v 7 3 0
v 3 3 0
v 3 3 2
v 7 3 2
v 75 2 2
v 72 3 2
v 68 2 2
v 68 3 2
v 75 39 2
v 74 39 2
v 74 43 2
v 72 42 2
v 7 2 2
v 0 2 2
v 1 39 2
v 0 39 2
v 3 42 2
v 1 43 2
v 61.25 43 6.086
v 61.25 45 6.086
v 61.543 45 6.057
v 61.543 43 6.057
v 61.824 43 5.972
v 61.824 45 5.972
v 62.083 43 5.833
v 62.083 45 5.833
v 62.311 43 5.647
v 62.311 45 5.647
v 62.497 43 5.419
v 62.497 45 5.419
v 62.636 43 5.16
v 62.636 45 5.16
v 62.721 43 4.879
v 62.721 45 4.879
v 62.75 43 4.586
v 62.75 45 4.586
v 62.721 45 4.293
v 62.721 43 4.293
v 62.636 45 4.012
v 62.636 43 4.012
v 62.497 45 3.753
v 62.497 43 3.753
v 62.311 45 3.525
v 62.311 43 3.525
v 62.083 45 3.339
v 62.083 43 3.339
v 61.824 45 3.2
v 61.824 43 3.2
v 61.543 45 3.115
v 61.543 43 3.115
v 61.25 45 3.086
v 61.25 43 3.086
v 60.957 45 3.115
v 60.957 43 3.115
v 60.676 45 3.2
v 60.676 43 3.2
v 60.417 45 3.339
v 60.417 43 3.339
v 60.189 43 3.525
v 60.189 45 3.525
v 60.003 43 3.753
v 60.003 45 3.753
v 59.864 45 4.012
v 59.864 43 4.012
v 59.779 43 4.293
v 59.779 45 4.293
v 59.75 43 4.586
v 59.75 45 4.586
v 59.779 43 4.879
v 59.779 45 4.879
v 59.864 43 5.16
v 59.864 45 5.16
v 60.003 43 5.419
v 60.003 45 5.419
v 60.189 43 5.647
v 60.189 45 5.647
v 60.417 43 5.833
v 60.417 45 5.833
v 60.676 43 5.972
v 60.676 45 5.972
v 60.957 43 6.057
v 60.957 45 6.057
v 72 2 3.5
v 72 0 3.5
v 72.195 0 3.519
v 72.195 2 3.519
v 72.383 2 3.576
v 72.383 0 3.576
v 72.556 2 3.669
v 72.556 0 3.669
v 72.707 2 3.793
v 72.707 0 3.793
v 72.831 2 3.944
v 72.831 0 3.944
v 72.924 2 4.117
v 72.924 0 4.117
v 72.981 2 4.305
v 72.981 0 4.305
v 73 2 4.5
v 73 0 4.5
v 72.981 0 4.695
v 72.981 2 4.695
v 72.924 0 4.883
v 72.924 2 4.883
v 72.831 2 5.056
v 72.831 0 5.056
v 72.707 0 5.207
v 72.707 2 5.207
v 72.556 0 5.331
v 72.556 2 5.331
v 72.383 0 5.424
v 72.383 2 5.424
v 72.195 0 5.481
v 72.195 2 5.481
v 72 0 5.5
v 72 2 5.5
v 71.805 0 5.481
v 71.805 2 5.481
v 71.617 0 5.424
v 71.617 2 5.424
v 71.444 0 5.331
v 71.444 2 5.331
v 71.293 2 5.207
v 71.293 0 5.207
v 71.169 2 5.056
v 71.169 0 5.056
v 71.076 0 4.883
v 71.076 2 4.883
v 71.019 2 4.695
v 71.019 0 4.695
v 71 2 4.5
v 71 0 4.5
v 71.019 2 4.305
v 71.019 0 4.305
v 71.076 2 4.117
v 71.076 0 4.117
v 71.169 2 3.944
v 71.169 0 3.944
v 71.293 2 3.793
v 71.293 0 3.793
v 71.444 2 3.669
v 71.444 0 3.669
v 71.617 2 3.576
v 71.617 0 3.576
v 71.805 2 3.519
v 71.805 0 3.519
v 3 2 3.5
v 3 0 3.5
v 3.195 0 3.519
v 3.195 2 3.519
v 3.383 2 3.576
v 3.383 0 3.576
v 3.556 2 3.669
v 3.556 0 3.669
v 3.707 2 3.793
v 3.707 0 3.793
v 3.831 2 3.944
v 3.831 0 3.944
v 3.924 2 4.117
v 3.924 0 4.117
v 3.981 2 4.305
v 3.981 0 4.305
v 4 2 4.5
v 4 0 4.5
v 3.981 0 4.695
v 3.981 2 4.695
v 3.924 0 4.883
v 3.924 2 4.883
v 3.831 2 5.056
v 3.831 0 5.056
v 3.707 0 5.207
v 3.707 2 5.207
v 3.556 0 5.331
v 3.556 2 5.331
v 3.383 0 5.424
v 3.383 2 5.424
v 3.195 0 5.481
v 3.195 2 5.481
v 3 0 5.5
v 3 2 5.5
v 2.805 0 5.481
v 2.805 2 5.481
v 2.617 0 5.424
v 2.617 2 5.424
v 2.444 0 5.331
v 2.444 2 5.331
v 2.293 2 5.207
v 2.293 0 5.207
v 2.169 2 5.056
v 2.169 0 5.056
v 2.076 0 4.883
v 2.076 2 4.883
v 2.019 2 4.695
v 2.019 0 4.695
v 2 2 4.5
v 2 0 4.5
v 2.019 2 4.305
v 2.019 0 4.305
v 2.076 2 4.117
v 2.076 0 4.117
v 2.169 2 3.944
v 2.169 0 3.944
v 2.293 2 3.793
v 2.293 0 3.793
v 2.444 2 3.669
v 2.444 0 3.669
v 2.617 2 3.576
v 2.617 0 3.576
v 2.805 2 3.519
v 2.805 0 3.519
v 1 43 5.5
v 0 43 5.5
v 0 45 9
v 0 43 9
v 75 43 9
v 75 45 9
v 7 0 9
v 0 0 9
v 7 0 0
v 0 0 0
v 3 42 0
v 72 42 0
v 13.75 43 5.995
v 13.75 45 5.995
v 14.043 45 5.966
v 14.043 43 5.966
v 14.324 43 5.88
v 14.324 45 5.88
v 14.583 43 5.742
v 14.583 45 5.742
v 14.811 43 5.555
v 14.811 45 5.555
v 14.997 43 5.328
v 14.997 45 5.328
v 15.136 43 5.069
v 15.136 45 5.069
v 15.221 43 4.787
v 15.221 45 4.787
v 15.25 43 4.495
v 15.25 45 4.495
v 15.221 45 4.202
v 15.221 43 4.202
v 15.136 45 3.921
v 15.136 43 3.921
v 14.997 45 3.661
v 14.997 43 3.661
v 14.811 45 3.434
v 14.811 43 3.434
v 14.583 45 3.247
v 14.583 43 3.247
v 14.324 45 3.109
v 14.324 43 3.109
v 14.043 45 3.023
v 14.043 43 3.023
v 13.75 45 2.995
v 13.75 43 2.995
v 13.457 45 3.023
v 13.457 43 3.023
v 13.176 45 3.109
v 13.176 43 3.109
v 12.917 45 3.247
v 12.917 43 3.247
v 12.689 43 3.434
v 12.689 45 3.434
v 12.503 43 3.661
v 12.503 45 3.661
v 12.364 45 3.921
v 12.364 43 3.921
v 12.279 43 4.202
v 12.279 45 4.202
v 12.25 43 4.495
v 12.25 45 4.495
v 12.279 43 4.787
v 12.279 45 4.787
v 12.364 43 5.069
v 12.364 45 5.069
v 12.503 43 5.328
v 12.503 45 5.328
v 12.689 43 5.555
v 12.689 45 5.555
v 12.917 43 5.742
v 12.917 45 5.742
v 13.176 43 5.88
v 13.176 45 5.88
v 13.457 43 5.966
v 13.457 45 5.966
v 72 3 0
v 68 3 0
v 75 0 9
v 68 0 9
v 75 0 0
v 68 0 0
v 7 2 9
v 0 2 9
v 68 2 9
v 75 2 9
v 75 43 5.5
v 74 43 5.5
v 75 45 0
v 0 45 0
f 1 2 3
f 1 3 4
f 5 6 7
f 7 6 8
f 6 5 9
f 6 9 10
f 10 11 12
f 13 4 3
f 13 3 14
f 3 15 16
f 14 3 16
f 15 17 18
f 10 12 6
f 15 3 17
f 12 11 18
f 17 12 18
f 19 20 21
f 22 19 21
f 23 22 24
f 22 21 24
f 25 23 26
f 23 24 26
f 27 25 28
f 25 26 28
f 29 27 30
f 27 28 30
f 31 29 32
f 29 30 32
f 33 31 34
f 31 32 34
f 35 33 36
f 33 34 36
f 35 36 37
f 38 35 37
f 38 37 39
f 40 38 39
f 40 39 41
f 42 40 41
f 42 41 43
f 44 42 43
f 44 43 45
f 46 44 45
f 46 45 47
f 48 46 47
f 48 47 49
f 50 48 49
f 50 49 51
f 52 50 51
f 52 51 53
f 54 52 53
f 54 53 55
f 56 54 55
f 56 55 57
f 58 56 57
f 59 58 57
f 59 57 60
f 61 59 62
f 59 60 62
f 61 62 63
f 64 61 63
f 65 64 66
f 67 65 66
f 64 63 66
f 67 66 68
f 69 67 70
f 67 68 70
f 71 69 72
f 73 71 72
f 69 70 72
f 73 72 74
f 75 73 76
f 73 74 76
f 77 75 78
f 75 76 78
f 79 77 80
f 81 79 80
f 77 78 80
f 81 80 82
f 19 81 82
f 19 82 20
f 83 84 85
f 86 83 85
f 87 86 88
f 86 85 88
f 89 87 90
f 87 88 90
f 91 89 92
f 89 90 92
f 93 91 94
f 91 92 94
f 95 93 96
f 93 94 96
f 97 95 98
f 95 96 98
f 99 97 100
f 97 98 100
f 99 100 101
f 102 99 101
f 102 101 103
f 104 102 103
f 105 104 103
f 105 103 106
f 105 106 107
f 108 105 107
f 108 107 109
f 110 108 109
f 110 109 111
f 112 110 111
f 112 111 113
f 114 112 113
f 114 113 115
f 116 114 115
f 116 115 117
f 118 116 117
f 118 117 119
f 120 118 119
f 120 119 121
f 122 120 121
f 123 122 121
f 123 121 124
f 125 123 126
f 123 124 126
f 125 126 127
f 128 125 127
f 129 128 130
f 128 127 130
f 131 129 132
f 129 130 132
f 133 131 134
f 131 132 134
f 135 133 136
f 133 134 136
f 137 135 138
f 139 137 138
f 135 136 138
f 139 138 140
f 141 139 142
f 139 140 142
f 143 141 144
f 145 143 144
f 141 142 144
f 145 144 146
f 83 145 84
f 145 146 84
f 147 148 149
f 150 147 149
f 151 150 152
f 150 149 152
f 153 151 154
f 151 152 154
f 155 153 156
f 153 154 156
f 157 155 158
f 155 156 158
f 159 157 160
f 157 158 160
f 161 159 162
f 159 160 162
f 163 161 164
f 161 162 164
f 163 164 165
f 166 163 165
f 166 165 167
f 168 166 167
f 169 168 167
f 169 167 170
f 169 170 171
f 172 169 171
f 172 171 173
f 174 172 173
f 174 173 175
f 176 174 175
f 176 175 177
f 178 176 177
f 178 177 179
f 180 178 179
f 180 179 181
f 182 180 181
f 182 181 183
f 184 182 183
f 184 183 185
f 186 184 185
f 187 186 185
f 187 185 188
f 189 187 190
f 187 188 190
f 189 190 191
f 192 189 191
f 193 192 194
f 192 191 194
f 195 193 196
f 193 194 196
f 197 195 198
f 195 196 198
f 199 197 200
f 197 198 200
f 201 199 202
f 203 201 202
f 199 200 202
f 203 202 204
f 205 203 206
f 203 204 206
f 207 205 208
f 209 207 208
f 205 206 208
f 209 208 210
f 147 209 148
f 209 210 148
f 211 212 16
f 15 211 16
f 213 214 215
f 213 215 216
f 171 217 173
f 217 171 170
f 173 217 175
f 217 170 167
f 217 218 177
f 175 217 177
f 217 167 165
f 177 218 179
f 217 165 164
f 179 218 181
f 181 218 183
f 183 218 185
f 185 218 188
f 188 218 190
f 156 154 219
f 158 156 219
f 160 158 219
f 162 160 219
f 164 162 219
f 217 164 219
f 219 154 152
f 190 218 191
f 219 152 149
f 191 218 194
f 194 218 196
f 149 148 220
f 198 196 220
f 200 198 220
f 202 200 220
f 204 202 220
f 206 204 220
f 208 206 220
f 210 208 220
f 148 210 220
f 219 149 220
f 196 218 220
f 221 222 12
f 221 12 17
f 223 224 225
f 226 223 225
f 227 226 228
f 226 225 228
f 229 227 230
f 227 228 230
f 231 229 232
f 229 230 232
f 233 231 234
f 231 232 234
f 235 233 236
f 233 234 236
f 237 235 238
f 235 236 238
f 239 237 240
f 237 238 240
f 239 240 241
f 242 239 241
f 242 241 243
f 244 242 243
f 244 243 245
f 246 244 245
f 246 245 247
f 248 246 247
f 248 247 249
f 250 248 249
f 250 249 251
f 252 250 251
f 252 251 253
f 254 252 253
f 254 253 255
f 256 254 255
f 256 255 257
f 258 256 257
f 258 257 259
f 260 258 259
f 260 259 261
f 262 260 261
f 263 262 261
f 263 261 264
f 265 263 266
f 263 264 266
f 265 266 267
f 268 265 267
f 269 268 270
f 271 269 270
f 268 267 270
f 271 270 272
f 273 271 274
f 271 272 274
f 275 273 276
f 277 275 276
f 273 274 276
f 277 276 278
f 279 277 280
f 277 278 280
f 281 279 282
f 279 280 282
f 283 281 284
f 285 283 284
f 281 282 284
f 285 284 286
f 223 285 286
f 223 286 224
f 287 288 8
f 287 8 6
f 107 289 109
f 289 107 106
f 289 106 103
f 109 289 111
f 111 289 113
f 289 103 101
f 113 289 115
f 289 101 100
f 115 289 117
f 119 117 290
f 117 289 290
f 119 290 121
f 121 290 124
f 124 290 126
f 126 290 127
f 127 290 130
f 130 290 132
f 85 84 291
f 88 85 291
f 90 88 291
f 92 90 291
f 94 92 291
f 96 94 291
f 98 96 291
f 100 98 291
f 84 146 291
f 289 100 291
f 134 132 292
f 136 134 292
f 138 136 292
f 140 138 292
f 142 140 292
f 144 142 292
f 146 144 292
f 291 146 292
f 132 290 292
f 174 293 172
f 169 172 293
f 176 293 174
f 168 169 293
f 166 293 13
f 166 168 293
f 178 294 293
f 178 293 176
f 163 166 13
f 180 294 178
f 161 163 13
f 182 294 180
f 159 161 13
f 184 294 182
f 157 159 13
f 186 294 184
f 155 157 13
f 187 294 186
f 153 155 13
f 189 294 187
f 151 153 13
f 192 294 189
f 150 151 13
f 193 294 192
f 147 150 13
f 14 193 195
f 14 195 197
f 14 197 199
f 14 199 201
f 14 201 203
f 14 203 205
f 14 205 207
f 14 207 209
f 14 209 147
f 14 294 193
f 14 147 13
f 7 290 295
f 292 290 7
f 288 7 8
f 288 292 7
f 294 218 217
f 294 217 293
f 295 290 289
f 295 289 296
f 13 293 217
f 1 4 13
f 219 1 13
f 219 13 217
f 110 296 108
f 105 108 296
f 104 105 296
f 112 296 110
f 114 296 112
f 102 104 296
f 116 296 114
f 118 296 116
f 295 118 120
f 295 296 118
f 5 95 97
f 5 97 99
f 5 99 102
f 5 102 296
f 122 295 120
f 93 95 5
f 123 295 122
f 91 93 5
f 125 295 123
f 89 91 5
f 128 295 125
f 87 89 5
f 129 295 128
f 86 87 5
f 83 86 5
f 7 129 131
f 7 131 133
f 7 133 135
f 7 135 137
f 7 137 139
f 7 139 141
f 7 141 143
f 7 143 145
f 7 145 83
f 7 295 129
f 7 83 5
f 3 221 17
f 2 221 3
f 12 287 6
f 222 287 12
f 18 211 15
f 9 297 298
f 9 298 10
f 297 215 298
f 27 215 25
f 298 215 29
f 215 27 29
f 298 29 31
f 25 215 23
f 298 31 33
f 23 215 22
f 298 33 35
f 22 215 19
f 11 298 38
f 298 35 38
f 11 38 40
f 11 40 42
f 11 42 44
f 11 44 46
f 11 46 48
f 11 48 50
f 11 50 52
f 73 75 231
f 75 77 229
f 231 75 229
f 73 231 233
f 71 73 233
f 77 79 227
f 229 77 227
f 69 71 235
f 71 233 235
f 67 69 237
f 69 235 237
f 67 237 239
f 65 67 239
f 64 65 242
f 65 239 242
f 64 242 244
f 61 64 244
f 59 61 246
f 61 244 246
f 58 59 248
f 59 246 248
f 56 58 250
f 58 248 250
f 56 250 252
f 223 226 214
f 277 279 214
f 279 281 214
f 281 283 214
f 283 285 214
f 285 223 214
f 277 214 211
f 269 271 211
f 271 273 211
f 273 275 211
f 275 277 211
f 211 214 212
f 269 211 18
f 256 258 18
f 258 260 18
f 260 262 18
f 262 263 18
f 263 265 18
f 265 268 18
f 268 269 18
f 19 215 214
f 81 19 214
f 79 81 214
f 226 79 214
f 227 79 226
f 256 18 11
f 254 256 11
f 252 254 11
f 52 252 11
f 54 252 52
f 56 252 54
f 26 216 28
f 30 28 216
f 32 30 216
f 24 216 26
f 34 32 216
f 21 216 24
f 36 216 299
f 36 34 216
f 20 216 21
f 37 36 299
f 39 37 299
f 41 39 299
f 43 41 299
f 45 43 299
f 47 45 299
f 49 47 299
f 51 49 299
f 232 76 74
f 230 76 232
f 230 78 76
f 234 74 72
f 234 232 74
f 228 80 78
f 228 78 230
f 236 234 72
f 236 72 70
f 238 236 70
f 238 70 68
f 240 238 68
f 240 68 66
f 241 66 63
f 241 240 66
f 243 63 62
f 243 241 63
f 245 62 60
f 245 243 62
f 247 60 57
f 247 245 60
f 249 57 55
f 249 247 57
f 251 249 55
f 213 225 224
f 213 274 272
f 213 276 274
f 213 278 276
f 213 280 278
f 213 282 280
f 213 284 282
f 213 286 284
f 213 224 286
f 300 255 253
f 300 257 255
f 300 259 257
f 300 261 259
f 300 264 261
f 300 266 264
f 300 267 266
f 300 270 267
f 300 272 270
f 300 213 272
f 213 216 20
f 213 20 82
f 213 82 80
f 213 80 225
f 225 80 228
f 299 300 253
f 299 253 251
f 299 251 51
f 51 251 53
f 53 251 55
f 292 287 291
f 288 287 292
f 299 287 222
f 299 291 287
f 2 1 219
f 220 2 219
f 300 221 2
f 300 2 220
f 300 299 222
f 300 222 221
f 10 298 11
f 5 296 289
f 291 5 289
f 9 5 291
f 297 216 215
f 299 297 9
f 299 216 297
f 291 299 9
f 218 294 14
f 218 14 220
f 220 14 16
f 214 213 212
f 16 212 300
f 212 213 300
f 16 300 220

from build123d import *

# Parameters (mm, degrees)
BOSS_EXTRUDE1_DEPTH = 2
BOSS_EXTRUDE2_REACH = 89.487
SKETCH2_W           = 7
SKETCH2_H           = 2
BOSS_EXTRUDE3_DEPTH = 1
CUT_EXTRUDE1_REACH  = 89.926
SKETCH7_R           = 1.5
CUT_EXTRUDE2_REACH  = 89.926
SKETCH8_R           = 1
SKETCH10_W          = 61
SKETCH10_H          = 2
CUT_EXTRUDE3_DEPTH  = 88.74394566


with BuildPart() as part:
    # Sketch1 → Boss-Extrude1 (new body)
    with BuildSketch(Plane.XY):
        Polygon((3, 3), (7, 3), (7, 0), (0, 0), (0, 45), (75, 45), (75, 0), (68, 0), (68, 3), (72, 3), (72, 42), (3, 42), align=None)
    extrude(amount=BOSS_EXTRUDE1_DEPTH)

    # Boss-Extrude2: up to this face of the body (flat: up to its plane)
    boss_extrude2_end = Plane(part.part.faces().sort_by_distance((75, 22.5, 1))[0])
    # Sketch2 → Boss-Extrude2 (add, up to the picked face)
    with BuildSketch(Plane(origin=(0, 0, 0), x_dir=(0, 0, -1), z_dir=(1, 0, 0)), mode=Mode.PRIVATE) as boss_extrude2_sk1:
        with Locations((-5.5, 44)):
            Rectangle(SKETCH2_W, SKETCH2_H)
    boss_extrude2_tool1 = split(extrude(boss_extrude2_sk1.sketch, amount=BOSS_EXTRUDE2_REACH, mode=Mode.PRIVATE), bisect_by=boss_extrude2_end, keep=Keep.BOTH, mode=Mode.PRIVATE)
    # Sketch2 → Boss-Extrude2 (add, up to the picked face)
    with BuildSketch(Plane(origin=(0, 0, 0), x_dir=(0, 0, -1), z_dir=(1, 0, 0)), mode=Mode.PRIVATE) as boss_extrude2_sk2:
        with Locations((-5.5, 1)):
            Rectangle(SKETCH2_W, SKETCH2_H)
    boss_extrude2_tool2 = split(extrude(boss_extrude2_sk2.sketch, amount=BOSS_EXTRUDE2_REACH, mode=Mode.PRIVATE), bisect_by=boss_extrude2_end, keep=Keep.BOTH, mode=Mode.PRIVATE)
    add(boss_extrude2_tool1.solids().sort_by(Axis((0, 44, 5.5), (1, 0, 0)))[0])
    add(boss_extrude2_tool2.solids().sort_by(Axis((0, 1, 5.5), (1, 0, 0)))[0])

    # Sketch5 → Boss-Extrude3 (add)
    with BuildSketch(Plane.ZY):
        Polygon((5.5, 43), (2, 39), (2, 43), align=None)
    boss_extrude3 = extrude(amount=-BOSS_EXTRUDE3_DEPTH)

    # Mirror1: Boss-Extrude3 across plane
    add(boss_extrude3.mirror(Plane.ZY.offset(-37.5)))

    # Sketch7 → Cut-Extrude1 (cut, up to next)
    with BuildSketch(Plane(origin=(0, 45, 0), x_dir=(1, 0, 0), z_dir=(0, 1, 0)), mode=Mode.PRIVATE) as cut_extrude1_sk1:
        with Locations(Location((13.750043931, -4.494608683, 0), (0, 0, 270))):
            Circle(SKETCH7_R)
    cut_extrude1_tool1 = extrude(cut_extrude1_sk1.sketch, amount=-CUT_EXTRUDE1_REACH, mode=Mode.PRIVATE) & part.part
    # Sketch7 → Cut-Extrude1 (cut, up to next)
    with BuildSketch(Plane(origin=(0, 45, 0), x_dir=(1, 0, 0), z_dir=(0, 1, 0)), mode=Mode.PRIVATE) as cut_extrude1_sk2:
        with Locations(Location((61.249956069, -4.585969821, 0), (0, 0, 270))):
            Circle(SKETCH7_R)
    cut_extrude1_tool2 = extrude(cut_extrude1_sk2.sketch, amount=-CUT_EXTRUDE1_REACH, mode=Mode.PRIVATE) & part.part
    add(cut_extrude1_tool1.solids().sort_by_distance((13.750044, 45, 4.494609))[0], mode=Mode.SUBTRACT)
    add(cut_extrude1_tool2.solids().sort_by_distance((61.249956, 45, 4.58597))[0], mode=Mode.SUBTRACT)

    # Sketch8 → Cut-Extrude2 (cut, up to next)
    with BuildSketch(Plane.XZ, mode=Mode.PRIVATE) as cut_extrude2_sk1:
        with Locations(Location((3, 4.5, 0), (0, 0, 270))):
            Circle(SKETCH8_R)
    cut_extrude2_tool1 = extrude(cut_extrude2_sk1.sketch, amount=-CUT_EXTRUDE2_REACH, mode=Mode.PRIVATE) & part.part
    # Sketch8 → Cut-Extrude2 (cut, up to next)
    with BuildSketch(Plane.XZ, mode=Mode.PRIVATE) as cut_extrude2_sk2:
        with Locations(Location((72, 4.5, 0), (0, 0, 270))):
            Circle(SKETCH8_R)
    cut_extrude2_tool2 = extrude(cut_extrude2_sk2.sketch, amount=-CUT_EXTRUDE2_REACH, mode=Mode.PRIVATE) & part.part
    add(cut_extrude2_tool1.solids().sort_by_distance((3, 0, 4.5))[0], mode=Mode.SUBTRACT)
    add(cut_extrude2_tool2.solids().sort_by_distance((72, 0, 4.5))[0], mode=Mode.SUBTRACT)

    # Sketch10 → Cut-Extrude3 (cut, through all)
    with BuildSketch(Plane(origin=(0, 0, 2), x_dir=(-1, 0, 0), z_dir=(0, 0, -1))):
        with Locations((-37.5, 1)):
            Rectangle(SKETCH10_W, SKETCH10_H)
    extrude(amount=-CUT_EXTRUDE3_DEPTH, mode=Mode.SUBTRACT)


solid = part.part
